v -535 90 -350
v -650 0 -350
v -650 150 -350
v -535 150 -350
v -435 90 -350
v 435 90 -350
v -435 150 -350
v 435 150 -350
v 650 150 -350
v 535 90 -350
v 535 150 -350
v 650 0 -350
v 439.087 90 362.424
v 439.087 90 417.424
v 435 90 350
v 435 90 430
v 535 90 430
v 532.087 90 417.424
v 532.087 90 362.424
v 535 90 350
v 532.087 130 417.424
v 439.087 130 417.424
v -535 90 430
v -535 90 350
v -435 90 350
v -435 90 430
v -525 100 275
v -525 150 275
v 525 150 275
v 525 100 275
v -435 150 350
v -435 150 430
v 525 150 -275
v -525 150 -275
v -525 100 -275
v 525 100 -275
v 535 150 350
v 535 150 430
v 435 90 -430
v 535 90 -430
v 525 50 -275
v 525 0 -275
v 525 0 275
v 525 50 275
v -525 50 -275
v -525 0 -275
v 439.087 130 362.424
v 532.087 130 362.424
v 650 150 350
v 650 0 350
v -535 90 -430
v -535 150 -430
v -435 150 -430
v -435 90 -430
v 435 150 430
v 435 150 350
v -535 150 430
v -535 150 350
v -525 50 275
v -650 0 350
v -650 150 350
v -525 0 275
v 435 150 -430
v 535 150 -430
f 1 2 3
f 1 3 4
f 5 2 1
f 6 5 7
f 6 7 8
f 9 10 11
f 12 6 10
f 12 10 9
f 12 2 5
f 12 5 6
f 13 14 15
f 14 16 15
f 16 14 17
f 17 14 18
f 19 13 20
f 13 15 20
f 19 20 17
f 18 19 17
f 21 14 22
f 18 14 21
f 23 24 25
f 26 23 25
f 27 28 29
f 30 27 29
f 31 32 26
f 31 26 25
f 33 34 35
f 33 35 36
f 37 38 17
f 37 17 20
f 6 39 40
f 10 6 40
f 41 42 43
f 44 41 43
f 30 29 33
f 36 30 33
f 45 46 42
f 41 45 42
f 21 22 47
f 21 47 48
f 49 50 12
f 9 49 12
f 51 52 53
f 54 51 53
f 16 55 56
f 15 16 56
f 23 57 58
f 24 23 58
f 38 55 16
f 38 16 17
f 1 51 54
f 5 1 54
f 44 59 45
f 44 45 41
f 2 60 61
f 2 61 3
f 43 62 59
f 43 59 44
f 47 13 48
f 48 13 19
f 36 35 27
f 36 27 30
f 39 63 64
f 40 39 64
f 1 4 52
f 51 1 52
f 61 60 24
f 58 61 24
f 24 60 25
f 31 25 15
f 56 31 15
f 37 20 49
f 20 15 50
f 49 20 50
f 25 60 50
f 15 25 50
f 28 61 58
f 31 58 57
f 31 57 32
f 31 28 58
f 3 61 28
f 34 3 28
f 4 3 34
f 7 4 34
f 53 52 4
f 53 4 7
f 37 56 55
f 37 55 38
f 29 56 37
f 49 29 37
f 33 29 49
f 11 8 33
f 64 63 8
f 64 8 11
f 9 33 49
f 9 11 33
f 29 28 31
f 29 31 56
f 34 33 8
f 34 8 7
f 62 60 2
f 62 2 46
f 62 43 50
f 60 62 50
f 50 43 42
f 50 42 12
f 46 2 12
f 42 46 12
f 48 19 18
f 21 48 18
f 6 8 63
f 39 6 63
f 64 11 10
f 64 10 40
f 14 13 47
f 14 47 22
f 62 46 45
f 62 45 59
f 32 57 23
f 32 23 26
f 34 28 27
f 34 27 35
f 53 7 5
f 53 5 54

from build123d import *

# Parameters (mm, degrees)
SKETCH1_W           = 1300
SKETCH1_H           = 700
BOSS_EXTRUDE1_DEPTH = 150
SKETCH2_W           = 1050
SKETCH2_H           = 550
CUT_EXTRUDE1_DEPTH  = 50
SKETCH3_W           = 1050
SKETCH3_H           = 550
CUT_EXTRUDE2_DEPTH  = 50
SKETCH14_W          = 100
SKETCH14_H          = 80
BOSS_EXTRUDE3_DEPTH = 60
SKETCH15_W          = 93
SKETCH15_H          = 55
CUT_EXTRUDE7_DEPTH  = 40
SKETCH16_W          = 100
SKETCH16_H          = 80
BOSS_EXTRUDE4_DEPTH = 60


with BuildPart() as part:
    # Sketch1 → Boss-Extrude1 (new body)
    with BuildSketch(Plane(origin=(0, 0, 0), x_dir=(1, 0, 0), z_dir=(0, 1, 0))):
        Rectangle(SKETCH1_W, SKETCH1_H)
    extrude(amount=BOSS_EXTRUDE1_DEPTH)

    # Sketch2 → Cut-Extrude1 (cut)
    with BuildSketch(Plane(origin=(0, 150, 0), x_dir=(1, 0, 0), z_dir=(0, 1, 0))):
        Rectangle(SKETCH2_W, SKETCH2_H)
    extrude(amount=-CUT_EXTRUDE1_DEPTH, mode=Mode.SUBTRACT)

    # Sketch3 → Cut-Extrude2 (cut)
    with BuildSketch(Plane.XZ):
        Rectangle(SKETCH3_W, SKETCH3_H)
    extrude(amount=-CUT_EXTRUDE2_DEPTH, mode=Mode.SUBTRACT)

    # Sketch14 → Boss-Extrude3 (add)
    with BuildSketch(Plane(origin=(0, 150, 0), x_dir=(1, 0, 0), z_dir=(0, 1, 0))):
        with Locations((485, -390)):
            Rectangle(SKETCH14_W, SKETCH14_H)
        with Locations((-485, -390)):
            Rectangle(SKETCH14_W, SKETCH14_H)
    extrude(amount=-BOSS_EXTRUDE3_DEPTH)

    # Sketch15 → Cut-Extrude7 (cut)
    with BuildSketch(Plane.XZ.offset(-90)):
        with Locations((485.587200579, 389.924483471)):
            Rectangle(SKETCH15_W, SKETCH15_H)
    extrude(amount=-CUT_EXTRUDE7_DEPTH, mode=Mode.SUBTRACT)

    # Sketch16 → Boss-Extrude4 (add)
    with BuildSketch(Plane(origin=(0, 150, 0), x_dir=(1, 0, 0), z_dir=(0, 1, 0))):
        with Locations((485, 390)):
            Rectangle(SKETCH16_W, SKETCH16_H)
        with Locations((-485, 390)):
            Rectangle(SKETCH16_W, SKETCH16_H)
    extrude(amount=-BOSS_EXTRUDE4_DEPTH)


solid = part.part
